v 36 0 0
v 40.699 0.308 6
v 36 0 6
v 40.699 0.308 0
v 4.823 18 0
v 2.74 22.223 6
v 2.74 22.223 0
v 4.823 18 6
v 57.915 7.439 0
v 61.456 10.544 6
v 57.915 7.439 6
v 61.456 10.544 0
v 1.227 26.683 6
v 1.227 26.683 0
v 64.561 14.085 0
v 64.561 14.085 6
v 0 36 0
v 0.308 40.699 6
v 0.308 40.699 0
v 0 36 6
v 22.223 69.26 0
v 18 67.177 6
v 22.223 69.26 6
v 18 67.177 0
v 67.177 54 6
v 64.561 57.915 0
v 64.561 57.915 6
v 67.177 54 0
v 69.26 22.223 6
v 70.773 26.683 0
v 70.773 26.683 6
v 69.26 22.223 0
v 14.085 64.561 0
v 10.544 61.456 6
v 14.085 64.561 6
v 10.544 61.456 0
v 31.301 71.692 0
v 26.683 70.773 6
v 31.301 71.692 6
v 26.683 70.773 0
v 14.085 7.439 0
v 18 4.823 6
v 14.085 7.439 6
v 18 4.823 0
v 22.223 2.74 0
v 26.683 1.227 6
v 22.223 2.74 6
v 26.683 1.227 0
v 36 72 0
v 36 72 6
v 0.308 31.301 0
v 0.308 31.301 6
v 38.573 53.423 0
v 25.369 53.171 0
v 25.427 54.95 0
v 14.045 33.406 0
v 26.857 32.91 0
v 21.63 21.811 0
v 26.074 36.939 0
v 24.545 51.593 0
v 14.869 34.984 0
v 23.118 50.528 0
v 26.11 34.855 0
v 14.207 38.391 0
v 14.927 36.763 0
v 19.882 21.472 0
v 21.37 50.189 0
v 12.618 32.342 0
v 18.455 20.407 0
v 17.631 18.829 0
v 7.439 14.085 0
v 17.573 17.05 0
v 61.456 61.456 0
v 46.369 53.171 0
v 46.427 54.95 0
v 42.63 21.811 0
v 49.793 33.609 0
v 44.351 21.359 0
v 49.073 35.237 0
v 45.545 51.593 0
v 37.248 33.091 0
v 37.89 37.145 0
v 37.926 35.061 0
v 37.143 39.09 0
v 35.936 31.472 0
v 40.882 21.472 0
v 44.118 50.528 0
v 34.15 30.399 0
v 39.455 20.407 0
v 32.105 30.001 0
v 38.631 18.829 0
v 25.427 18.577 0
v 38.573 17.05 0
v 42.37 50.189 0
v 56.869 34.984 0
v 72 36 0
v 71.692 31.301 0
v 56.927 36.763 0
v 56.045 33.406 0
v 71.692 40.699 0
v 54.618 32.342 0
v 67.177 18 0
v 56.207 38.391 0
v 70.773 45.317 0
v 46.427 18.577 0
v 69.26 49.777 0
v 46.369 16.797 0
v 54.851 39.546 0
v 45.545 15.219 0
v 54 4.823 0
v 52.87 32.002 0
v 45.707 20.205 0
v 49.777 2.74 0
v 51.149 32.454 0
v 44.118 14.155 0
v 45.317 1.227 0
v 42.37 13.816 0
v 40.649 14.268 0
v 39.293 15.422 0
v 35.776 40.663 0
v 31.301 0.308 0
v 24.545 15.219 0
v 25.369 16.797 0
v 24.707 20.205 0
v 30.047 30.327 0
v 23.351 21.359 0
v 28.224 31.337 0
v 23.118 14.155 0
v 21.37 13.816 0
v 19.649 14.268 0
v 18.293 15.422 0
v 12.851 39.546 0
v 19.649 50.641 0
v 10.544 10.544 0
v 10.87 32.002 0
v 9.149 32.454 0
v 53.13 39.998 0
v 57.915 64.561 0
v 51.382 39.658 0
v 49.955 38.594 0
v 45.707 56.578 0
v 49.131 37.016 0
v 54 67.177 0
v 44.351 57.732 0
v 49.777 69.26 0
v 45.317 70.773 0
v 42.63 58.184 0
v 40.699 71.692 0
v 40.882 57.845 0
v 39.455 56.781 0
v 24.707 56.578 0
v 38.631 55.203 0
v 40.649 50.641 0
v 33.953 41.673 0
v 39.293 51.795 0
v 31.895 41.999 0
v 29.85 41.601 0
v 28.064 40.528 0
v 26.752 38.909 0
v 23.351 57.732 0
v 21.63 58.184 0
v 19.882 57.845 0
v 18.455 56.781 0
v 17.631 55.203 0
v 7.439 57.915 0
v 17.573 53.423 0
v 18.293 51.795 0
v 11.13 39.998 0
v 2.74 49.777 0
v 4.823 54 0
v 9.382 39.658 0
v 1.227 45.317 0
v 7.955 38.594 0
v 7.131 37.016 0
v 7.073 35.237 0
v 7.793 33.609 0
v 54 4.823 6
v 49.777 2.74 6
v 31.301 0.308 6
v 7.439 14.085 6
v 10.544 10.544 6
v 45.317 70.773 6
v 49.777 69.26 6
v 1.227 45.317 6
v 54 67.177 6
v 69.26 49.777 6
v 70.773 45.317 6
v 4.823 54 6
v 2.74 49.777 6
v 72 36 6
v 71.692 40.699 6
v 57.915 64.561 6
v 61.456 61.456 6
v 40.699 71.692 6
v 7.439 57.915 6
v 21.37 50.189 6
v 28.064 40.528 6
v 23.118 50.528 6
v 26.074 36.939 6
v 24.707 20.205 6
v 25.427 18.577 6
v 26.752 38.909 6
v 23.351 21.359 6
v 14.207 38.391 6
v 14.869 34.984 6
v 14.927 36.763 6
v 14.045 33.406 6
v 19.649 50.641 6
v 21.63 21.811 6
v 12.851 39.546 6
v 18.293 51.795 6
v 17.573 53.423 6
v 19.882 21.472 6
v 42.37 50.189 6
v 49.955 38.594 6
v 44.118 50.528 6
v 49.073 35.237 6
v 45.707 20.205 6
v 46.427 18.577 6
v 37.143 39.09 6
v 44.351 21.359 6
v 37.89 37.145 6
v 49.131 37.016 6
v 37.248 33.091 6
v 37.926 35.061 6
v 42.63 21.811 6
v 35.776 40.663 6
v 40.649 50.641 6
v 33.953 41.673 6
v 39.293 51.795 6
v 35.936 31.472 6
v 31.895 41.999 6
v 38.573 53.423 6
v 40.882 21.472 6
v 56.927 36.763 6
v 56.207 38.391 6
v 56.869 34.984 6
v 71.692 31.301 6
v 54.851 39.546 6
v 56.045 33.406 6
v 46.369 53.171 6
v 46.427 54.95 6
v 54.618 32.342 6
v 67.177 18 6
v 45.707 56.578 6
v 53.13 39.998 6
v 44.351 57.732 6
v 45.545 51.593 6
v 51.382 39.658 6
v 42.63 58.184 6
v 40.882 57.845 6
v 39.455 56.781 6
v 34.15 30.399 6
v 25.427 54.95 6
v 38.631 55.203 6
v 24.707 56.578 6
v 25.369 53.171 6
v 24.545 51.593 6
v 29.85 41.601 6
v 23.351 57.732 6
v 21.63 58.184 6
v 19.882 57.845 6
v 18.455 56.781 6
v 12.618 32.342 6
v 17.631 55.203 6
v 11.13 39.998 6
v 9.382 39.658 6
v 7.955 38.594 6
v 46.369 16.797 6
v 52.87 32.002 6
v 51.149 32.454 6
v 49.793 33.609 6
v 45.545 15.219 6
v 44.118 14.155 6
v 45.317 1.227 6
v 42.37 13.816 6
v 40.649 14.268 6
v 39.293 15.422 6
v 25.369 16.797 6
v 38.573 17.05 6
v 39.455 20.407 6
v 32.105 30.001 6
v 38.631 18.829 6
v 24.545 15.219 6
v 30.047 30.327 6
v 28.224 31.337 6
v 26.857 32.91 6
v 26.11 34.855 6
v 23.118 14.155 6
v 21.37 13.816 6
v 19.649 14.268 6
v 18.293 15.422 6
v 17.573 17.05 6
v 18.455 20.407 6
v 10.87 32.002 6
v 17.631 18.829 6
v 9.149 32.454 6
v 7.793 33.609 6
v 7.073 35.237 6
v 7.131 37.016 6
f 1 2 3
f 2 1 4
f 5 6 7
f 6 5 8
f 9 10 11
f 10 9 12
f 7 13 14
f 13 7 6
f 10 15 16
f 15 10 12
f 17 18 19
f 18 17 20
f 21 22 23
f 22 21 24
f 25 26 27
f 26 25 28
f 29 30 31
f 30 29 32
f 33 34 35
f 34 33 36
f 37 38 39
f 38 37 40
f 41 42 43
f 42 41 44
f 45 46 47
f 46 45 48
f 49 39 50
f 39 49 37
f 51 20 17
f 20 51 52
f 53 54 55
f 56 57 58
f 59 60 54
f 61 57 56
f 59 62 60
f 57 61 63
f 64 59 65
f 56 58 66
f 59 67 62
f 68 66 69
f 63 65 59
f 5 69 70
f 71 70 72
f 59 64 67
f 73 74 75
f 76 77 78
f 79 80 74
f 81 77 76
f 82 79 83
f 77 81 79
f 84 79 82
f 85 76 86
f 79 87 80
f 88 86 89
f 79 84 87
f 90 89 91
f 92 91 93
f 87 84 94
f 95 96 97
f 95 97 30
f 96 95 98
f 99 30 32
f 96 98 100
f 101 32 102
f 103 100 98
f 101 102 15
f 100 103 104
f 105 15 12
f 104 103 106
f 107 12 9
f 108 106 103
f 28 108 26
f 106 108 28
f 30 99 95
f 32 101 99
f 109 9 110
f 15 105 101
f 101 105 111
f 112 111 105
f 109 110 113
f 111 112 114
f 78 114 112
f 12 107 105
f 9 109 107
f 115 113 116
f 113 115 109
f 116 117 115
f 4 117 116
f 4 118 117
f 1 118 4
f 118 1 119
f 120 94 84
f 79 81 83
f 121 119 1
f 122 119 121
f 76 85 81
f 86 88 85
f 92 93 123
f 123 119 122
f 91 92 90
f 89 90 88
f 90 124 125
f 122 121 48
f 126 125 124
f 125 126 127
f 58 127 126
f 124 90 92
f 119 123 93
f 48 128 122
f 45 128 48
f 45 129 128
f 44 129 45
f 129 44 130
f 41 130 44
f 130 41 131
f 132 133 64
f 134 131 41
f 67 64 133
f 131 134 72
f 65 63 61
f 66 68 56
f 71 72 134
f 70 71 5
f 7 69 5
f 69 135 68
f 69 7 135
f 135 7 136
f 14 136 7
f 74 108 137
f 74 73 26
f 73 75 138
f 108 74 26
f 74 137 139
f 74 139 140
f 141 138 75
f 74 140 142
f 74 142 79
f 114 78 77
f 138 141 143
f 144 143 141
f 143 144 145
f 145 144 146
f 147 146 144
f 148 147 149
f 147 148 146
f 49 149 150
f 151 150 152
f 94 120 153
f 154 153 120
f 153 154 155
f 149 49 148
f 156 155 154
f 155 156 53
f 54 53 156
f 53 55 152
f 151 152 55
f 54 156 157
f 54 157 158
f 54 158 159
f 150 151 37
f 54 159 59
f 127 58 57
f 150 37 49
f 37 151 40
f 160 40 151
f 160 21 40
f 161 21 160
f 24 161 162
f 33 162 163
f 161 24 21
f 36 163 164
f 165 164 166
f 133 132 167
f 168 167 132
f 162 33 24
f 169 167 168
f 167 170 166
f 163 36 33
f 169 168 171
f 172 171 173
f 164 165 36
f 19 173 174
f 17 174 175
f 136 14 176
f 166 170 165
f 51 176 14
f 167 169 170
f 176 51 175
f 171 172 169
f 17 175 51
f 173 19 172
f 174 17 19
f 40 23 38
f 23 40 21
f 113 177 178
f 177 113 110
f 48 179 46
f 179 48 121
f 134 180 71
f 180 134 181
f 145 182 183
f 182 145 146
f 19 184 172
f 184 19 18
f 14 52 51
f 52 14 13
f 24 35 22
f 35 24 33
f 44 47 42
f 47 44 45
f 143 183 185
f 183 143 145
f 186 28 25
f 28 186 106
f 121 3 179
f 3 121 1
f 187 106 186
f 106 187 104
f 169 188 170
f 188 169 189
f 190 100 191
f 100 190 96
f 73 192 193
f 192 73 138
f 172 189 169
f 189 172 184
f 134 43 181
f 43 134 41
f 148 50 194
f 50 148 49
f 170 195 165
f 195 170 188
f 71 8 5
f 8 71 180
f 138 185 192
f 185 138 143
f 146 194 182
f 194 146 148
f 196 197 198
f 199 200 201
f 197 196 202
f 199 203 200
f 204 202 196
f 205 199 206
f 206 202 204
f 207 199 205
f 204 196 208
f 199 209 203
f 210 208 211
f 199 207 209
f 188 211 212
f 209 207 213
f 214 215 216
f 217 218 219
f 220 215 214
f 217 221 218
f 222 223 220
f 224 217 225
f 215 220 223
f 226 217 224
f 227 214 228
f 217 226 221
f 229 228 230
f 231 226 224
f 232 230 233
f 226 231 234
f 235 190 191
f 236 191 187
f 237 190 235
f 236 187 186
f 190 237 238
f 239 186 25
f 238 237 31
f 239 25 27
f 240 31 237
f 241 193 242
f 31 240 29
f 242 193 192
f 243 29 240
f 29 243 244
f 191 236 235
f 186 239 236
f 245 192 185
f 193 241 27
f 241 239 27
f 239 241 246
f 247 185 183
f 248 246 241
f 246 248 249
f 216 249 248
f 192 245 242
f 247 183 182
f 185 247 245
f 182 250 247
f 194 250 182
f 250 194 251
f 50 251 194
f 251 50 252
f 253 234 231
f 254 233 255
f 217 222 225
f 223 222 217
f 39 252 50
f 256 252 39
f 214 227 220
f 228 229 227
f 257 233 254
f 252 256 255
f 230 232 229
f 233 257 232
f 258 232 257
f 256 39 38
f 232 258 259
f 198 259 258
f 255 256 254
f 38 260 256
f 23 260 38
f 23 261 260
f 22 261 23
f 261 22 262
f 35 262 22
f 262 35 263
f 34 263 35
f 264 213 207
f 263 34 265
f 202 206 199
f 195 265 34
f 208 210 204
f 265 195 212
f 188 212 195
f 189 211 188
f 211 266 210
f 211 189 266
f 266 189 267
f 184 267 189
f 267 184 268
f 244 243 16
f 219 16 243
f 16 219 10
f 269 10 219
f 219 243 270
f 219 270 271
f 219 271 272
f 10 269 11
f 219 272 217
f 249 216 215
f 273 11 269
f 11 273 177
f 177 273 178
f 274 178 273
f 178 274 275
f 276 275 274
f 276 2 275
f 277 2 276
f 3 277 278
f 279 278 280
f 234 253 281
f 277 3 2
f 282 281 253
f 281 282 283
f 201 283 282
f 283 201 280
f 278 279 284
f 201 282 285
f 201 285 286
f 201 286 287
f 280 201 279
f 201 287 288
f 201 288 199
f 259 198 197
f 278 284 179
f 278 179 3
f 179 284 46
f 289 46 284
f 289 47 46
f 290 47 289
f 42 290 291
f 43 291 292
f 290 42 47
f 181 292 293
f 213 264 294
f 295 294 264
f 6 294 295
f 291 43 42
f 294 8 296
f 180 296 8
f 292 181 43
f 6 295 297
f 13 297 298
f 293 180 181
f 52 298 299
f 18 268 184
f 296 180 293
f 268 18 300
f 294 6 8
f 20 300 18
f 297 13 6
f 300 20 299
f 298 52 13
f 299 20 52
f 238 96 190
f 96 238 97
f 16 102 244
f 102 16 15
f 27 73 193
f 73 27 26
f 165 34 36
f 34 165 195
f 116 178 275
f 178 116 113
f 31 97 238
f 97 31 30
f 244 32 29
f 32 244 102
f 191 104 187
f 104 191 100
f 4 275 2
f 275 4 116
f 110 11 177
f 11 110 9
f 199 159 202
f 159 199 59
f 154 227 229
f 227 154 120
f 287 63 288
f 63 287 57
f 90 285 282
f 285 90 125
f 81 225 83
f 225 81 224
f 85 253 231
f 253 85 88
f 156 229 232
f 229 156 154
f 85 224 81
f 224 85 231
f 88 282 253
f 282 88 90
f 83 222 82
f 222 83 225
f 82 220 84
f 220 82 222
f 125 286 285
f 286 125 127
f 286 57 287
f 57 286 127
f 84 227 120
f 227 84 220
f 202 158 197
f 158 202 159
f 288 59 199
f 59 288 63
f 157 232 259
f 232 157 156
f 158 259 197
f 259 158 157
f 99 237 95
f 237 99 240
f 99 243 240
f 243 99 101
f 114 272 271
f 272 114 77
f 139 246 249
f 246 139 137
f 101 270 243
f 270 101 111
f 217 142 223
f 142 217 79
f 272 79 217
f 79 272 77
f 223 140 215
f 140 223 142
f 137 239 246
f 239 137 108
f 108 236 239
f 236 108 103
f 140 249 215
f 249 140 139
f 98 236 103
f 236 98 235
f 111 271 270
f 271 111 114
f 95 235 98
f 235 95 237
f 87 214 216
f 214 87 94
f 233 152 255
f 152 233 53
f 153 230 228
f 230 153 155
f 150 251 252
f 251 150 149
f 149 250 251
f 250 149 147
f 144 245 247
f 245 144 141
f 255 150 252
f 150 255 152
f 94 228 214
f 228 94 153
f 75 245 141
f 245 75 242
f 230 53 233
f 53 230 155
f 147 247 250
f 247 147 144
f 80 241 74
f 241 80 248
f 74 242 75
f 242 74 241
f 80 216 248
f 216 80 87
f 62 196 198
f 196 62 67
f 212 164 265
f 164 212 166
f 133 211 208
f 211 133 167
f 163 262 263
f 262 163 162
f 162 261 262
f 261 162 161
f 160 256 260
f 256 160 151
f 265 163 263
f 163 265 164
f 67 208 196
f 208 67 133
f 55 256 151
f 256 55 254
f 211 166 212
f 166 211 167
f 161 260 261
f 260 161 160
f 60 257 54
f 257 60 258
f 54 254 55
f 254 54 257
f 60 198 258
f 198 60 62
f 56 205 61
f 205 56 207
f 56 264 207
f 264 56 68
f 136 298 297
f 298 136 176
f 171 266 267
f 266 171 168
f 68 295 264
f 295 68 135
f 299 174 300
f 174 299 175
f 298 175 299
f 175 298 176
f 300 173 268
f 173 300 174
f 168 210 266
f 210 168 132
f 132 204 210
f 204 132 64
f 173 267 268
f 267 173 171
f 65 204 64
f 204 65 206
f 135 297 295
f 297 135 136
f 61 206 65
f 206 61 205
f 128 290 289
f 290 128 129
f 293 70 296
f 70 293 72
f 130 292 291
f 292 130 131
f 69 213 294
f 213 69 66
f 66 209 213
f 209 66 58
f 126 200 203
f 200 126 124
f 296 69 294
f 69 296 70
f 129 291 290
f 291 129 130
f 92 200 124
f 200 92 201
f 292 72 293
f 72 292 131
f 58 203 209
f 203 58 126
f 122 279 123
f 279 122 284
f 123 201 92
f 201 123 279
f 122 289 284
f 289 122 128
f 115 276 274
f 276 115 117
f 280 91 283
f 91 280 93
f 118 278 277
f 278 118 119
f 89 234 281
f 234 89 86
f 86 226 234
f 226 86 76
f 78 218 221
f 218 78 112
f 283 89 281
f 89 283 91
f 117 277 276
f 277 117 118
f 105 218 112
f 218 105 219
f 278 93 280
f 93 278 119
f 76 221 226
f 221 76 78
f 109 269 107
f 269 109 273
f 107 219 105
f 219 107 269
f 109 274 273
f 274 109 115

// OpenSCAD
$fn = 32;

// ----------------------------------------------------------------------
// Cam plate: eccentric cam, base R36
// ----------------------------------------------------------------------

// --- parameters (mm) ---
base_r = 36;              // base circle radius
lobe_h = 14;              // cam lobe rise
bore_r = 6;               // shaft bore radius
plate_t = 6;              // plate thickness, Z (extrusion height)
ecc = 4;                  // disc eccentricity
ring_r = 21;              // lightening ring radius
bolt_r = 4;               // lightening hole radius
fit_tol = 0.1;            // declared fit tolerance (prompt contract)
free_tol = 0.3;           // declared free tolerance (prompt contract)

profile = [[72, 36], [71.692, 40.699], [70.773, 45.317], [69.26, 49.777], [67.177, 54], [64.561, 57.915], [61.456, 61.456], [57.915, 64.561], [54, 67.177], [49.777, 69.26], [45.317, 70.773], [40.699, 71.692], [36, 72], [31.301, 71.692], [26.683, 70.773], [22.223, 69.26], [18, 67.177], [14.085, 64.561], [10.544, 61.456], [7.439, 57.915], [4.823, 54], [2.74, 49.777], [1.227, 45.317], [0.308, 40.699], [0, 36], [0.308, 31.301], [1.227, 26.683], [2.74, 22.223], [4.823, 18], [7.439, 14.085], [10.544, 10.544], [14.085, 7.439], [18, 4.823], [22.223, 2.74], [26.683, 1.227], [31.301, 0.308], [36, 0], [40.699, 0.308], [45.317, 1.227], [49.777, 2.74], [54, 4.823], [57.915, 7.439], [61.456, 10.544], [64.561, 14.085], [67.177, 18], [69.26, 22.223], [70.773, 26.683], [71.692, 31.301]];  // primary outline, 48 points, counter clockwise
void_1 = [[37.89, 37.145], [37.143, 39.09], [35.776, 40.663], [33.953, 41.673], [31.895, 41.999], [29.85, 41.601], [28.064, 40.528], [26.752, 38.909], [26.074, 36.939], [26.11, 34.855], [26.857, 32.91], [28.224, 31.337], [30.047, 30.327], [32.105, 30.001], [34.15, 30.399], [35.936, 31.472], [37.248, 33.091], [37.926, 35.061]];  // shaft bore, 18 points
void_2 = [[56.927, 36.763], [56.207, 38.391], [54.851, 39.546], [53.13, 39.998], [51.382, 39.658], [49.955, 38.594], [49.131, 37.016], [49.073, 35.237], [49.793, 33.609], [51.149, 32.454], [52.87, 32.002], [54.618, 32.342], [56.045, 33.406], [56.869, 34.984]];  // lightening hole 1, 14 points
void_3 = [[46.427, 54.95], [45.707, 56.578], [44.351, 57.732], [42.63, 58.184], [40.882, 57.845], [39.455, 56.781], [38.631, 55.203], [38.573, 53.423], [39.293, 51.795], [40.649, 50.641], [42.37, 50.189], [44.118, 50.528], [45.545, 51.593], [46.369, 53.171]];  // lightening hole 2, 14 points
void_4 = [[25.427, 54.95], [24.707, 56.578], [23.351, 57.732], [21.63, 58.184], [19.882, 57.845], [18.455, 56.781], [17.631, 55.203], [17.573, 53.423], [18.293, 51.795], [19.649, 50.641], [21.37, 50.189], [23.118, 50.528], [24.545, 51.593], [25.369, 53.171]];  // lightening hole 3, 14 points
void_5 = [[14.927, 36.763], [14.207, 38.391], [12.851, 39.546], [11.13, 39.998], [9.382, 39.658], [7.955, 38.594], [7.131, 37.016], [7.073, 35.237], [7.793, 33.609], [9.149, 32.454], [10.87, 32.002], [12.618, 32.342], [14.045, 33.406], [14.869, 34.984]];  // lightening hole 4, 14 points
void_6 = [[25.427, 18.577], [24.707, 20.205], [23.351, 21.359], [21.63, 21.811], [19.882, 21.472], [18.455, 20.407], [17.631, 18.829], [17.573, 17.05], [18.293, 15.422], [19.649, 14.268], [21.37, 13.816], [23.118, 14.155], [24.545, 15.219], [25.369, 16.797]];  // lightening hole 5, 14 points
void_7 = [[46.427, 18.577], [45.707, 20.205], [44.351, 21.359], [42.63, 21.811], [40.882, 21.472], [39.455, 20.407], [38.631, 18.829], [38.573, 17.05], [39.293, 15.422], [40.649, 14.268], [42.37, 13.816], [44.118, 14.155], [45.545, 15.219], [46.369, 16.797]];  // lightening hole 6, 14 points

// --- the one profile operation ---
difference() {
  linear_extrude(height = plate_t) polygon(points = profile);
  translate([0, 0, -1])
    linear_extrude(height = plate_t + 2) polygon(points = void_1);
  translate([0, 0, -1])
    linear_extrude(height = plate_t + 2) polygon(points = void_2);
  translate([0, 0, -1])
    linear_extrude(height = plate_t + 2) polygon(points = void_3);
  translate([0, 0, -1])
    linear_extrude(height = plate_t + 2) polygon(points = void_4);
  translate([0, 0, -1])
    linear_extrude(height = plate_t + 2) polygon(points = void_5);
  translate([0, 0, -1])
    linear_extrude(height = plate_t + 2) polygon(points = void_6);
  translate([0, 0, -1])
    linear_extrude(height = plate_t + 2) polygon(points = void_7);
}
